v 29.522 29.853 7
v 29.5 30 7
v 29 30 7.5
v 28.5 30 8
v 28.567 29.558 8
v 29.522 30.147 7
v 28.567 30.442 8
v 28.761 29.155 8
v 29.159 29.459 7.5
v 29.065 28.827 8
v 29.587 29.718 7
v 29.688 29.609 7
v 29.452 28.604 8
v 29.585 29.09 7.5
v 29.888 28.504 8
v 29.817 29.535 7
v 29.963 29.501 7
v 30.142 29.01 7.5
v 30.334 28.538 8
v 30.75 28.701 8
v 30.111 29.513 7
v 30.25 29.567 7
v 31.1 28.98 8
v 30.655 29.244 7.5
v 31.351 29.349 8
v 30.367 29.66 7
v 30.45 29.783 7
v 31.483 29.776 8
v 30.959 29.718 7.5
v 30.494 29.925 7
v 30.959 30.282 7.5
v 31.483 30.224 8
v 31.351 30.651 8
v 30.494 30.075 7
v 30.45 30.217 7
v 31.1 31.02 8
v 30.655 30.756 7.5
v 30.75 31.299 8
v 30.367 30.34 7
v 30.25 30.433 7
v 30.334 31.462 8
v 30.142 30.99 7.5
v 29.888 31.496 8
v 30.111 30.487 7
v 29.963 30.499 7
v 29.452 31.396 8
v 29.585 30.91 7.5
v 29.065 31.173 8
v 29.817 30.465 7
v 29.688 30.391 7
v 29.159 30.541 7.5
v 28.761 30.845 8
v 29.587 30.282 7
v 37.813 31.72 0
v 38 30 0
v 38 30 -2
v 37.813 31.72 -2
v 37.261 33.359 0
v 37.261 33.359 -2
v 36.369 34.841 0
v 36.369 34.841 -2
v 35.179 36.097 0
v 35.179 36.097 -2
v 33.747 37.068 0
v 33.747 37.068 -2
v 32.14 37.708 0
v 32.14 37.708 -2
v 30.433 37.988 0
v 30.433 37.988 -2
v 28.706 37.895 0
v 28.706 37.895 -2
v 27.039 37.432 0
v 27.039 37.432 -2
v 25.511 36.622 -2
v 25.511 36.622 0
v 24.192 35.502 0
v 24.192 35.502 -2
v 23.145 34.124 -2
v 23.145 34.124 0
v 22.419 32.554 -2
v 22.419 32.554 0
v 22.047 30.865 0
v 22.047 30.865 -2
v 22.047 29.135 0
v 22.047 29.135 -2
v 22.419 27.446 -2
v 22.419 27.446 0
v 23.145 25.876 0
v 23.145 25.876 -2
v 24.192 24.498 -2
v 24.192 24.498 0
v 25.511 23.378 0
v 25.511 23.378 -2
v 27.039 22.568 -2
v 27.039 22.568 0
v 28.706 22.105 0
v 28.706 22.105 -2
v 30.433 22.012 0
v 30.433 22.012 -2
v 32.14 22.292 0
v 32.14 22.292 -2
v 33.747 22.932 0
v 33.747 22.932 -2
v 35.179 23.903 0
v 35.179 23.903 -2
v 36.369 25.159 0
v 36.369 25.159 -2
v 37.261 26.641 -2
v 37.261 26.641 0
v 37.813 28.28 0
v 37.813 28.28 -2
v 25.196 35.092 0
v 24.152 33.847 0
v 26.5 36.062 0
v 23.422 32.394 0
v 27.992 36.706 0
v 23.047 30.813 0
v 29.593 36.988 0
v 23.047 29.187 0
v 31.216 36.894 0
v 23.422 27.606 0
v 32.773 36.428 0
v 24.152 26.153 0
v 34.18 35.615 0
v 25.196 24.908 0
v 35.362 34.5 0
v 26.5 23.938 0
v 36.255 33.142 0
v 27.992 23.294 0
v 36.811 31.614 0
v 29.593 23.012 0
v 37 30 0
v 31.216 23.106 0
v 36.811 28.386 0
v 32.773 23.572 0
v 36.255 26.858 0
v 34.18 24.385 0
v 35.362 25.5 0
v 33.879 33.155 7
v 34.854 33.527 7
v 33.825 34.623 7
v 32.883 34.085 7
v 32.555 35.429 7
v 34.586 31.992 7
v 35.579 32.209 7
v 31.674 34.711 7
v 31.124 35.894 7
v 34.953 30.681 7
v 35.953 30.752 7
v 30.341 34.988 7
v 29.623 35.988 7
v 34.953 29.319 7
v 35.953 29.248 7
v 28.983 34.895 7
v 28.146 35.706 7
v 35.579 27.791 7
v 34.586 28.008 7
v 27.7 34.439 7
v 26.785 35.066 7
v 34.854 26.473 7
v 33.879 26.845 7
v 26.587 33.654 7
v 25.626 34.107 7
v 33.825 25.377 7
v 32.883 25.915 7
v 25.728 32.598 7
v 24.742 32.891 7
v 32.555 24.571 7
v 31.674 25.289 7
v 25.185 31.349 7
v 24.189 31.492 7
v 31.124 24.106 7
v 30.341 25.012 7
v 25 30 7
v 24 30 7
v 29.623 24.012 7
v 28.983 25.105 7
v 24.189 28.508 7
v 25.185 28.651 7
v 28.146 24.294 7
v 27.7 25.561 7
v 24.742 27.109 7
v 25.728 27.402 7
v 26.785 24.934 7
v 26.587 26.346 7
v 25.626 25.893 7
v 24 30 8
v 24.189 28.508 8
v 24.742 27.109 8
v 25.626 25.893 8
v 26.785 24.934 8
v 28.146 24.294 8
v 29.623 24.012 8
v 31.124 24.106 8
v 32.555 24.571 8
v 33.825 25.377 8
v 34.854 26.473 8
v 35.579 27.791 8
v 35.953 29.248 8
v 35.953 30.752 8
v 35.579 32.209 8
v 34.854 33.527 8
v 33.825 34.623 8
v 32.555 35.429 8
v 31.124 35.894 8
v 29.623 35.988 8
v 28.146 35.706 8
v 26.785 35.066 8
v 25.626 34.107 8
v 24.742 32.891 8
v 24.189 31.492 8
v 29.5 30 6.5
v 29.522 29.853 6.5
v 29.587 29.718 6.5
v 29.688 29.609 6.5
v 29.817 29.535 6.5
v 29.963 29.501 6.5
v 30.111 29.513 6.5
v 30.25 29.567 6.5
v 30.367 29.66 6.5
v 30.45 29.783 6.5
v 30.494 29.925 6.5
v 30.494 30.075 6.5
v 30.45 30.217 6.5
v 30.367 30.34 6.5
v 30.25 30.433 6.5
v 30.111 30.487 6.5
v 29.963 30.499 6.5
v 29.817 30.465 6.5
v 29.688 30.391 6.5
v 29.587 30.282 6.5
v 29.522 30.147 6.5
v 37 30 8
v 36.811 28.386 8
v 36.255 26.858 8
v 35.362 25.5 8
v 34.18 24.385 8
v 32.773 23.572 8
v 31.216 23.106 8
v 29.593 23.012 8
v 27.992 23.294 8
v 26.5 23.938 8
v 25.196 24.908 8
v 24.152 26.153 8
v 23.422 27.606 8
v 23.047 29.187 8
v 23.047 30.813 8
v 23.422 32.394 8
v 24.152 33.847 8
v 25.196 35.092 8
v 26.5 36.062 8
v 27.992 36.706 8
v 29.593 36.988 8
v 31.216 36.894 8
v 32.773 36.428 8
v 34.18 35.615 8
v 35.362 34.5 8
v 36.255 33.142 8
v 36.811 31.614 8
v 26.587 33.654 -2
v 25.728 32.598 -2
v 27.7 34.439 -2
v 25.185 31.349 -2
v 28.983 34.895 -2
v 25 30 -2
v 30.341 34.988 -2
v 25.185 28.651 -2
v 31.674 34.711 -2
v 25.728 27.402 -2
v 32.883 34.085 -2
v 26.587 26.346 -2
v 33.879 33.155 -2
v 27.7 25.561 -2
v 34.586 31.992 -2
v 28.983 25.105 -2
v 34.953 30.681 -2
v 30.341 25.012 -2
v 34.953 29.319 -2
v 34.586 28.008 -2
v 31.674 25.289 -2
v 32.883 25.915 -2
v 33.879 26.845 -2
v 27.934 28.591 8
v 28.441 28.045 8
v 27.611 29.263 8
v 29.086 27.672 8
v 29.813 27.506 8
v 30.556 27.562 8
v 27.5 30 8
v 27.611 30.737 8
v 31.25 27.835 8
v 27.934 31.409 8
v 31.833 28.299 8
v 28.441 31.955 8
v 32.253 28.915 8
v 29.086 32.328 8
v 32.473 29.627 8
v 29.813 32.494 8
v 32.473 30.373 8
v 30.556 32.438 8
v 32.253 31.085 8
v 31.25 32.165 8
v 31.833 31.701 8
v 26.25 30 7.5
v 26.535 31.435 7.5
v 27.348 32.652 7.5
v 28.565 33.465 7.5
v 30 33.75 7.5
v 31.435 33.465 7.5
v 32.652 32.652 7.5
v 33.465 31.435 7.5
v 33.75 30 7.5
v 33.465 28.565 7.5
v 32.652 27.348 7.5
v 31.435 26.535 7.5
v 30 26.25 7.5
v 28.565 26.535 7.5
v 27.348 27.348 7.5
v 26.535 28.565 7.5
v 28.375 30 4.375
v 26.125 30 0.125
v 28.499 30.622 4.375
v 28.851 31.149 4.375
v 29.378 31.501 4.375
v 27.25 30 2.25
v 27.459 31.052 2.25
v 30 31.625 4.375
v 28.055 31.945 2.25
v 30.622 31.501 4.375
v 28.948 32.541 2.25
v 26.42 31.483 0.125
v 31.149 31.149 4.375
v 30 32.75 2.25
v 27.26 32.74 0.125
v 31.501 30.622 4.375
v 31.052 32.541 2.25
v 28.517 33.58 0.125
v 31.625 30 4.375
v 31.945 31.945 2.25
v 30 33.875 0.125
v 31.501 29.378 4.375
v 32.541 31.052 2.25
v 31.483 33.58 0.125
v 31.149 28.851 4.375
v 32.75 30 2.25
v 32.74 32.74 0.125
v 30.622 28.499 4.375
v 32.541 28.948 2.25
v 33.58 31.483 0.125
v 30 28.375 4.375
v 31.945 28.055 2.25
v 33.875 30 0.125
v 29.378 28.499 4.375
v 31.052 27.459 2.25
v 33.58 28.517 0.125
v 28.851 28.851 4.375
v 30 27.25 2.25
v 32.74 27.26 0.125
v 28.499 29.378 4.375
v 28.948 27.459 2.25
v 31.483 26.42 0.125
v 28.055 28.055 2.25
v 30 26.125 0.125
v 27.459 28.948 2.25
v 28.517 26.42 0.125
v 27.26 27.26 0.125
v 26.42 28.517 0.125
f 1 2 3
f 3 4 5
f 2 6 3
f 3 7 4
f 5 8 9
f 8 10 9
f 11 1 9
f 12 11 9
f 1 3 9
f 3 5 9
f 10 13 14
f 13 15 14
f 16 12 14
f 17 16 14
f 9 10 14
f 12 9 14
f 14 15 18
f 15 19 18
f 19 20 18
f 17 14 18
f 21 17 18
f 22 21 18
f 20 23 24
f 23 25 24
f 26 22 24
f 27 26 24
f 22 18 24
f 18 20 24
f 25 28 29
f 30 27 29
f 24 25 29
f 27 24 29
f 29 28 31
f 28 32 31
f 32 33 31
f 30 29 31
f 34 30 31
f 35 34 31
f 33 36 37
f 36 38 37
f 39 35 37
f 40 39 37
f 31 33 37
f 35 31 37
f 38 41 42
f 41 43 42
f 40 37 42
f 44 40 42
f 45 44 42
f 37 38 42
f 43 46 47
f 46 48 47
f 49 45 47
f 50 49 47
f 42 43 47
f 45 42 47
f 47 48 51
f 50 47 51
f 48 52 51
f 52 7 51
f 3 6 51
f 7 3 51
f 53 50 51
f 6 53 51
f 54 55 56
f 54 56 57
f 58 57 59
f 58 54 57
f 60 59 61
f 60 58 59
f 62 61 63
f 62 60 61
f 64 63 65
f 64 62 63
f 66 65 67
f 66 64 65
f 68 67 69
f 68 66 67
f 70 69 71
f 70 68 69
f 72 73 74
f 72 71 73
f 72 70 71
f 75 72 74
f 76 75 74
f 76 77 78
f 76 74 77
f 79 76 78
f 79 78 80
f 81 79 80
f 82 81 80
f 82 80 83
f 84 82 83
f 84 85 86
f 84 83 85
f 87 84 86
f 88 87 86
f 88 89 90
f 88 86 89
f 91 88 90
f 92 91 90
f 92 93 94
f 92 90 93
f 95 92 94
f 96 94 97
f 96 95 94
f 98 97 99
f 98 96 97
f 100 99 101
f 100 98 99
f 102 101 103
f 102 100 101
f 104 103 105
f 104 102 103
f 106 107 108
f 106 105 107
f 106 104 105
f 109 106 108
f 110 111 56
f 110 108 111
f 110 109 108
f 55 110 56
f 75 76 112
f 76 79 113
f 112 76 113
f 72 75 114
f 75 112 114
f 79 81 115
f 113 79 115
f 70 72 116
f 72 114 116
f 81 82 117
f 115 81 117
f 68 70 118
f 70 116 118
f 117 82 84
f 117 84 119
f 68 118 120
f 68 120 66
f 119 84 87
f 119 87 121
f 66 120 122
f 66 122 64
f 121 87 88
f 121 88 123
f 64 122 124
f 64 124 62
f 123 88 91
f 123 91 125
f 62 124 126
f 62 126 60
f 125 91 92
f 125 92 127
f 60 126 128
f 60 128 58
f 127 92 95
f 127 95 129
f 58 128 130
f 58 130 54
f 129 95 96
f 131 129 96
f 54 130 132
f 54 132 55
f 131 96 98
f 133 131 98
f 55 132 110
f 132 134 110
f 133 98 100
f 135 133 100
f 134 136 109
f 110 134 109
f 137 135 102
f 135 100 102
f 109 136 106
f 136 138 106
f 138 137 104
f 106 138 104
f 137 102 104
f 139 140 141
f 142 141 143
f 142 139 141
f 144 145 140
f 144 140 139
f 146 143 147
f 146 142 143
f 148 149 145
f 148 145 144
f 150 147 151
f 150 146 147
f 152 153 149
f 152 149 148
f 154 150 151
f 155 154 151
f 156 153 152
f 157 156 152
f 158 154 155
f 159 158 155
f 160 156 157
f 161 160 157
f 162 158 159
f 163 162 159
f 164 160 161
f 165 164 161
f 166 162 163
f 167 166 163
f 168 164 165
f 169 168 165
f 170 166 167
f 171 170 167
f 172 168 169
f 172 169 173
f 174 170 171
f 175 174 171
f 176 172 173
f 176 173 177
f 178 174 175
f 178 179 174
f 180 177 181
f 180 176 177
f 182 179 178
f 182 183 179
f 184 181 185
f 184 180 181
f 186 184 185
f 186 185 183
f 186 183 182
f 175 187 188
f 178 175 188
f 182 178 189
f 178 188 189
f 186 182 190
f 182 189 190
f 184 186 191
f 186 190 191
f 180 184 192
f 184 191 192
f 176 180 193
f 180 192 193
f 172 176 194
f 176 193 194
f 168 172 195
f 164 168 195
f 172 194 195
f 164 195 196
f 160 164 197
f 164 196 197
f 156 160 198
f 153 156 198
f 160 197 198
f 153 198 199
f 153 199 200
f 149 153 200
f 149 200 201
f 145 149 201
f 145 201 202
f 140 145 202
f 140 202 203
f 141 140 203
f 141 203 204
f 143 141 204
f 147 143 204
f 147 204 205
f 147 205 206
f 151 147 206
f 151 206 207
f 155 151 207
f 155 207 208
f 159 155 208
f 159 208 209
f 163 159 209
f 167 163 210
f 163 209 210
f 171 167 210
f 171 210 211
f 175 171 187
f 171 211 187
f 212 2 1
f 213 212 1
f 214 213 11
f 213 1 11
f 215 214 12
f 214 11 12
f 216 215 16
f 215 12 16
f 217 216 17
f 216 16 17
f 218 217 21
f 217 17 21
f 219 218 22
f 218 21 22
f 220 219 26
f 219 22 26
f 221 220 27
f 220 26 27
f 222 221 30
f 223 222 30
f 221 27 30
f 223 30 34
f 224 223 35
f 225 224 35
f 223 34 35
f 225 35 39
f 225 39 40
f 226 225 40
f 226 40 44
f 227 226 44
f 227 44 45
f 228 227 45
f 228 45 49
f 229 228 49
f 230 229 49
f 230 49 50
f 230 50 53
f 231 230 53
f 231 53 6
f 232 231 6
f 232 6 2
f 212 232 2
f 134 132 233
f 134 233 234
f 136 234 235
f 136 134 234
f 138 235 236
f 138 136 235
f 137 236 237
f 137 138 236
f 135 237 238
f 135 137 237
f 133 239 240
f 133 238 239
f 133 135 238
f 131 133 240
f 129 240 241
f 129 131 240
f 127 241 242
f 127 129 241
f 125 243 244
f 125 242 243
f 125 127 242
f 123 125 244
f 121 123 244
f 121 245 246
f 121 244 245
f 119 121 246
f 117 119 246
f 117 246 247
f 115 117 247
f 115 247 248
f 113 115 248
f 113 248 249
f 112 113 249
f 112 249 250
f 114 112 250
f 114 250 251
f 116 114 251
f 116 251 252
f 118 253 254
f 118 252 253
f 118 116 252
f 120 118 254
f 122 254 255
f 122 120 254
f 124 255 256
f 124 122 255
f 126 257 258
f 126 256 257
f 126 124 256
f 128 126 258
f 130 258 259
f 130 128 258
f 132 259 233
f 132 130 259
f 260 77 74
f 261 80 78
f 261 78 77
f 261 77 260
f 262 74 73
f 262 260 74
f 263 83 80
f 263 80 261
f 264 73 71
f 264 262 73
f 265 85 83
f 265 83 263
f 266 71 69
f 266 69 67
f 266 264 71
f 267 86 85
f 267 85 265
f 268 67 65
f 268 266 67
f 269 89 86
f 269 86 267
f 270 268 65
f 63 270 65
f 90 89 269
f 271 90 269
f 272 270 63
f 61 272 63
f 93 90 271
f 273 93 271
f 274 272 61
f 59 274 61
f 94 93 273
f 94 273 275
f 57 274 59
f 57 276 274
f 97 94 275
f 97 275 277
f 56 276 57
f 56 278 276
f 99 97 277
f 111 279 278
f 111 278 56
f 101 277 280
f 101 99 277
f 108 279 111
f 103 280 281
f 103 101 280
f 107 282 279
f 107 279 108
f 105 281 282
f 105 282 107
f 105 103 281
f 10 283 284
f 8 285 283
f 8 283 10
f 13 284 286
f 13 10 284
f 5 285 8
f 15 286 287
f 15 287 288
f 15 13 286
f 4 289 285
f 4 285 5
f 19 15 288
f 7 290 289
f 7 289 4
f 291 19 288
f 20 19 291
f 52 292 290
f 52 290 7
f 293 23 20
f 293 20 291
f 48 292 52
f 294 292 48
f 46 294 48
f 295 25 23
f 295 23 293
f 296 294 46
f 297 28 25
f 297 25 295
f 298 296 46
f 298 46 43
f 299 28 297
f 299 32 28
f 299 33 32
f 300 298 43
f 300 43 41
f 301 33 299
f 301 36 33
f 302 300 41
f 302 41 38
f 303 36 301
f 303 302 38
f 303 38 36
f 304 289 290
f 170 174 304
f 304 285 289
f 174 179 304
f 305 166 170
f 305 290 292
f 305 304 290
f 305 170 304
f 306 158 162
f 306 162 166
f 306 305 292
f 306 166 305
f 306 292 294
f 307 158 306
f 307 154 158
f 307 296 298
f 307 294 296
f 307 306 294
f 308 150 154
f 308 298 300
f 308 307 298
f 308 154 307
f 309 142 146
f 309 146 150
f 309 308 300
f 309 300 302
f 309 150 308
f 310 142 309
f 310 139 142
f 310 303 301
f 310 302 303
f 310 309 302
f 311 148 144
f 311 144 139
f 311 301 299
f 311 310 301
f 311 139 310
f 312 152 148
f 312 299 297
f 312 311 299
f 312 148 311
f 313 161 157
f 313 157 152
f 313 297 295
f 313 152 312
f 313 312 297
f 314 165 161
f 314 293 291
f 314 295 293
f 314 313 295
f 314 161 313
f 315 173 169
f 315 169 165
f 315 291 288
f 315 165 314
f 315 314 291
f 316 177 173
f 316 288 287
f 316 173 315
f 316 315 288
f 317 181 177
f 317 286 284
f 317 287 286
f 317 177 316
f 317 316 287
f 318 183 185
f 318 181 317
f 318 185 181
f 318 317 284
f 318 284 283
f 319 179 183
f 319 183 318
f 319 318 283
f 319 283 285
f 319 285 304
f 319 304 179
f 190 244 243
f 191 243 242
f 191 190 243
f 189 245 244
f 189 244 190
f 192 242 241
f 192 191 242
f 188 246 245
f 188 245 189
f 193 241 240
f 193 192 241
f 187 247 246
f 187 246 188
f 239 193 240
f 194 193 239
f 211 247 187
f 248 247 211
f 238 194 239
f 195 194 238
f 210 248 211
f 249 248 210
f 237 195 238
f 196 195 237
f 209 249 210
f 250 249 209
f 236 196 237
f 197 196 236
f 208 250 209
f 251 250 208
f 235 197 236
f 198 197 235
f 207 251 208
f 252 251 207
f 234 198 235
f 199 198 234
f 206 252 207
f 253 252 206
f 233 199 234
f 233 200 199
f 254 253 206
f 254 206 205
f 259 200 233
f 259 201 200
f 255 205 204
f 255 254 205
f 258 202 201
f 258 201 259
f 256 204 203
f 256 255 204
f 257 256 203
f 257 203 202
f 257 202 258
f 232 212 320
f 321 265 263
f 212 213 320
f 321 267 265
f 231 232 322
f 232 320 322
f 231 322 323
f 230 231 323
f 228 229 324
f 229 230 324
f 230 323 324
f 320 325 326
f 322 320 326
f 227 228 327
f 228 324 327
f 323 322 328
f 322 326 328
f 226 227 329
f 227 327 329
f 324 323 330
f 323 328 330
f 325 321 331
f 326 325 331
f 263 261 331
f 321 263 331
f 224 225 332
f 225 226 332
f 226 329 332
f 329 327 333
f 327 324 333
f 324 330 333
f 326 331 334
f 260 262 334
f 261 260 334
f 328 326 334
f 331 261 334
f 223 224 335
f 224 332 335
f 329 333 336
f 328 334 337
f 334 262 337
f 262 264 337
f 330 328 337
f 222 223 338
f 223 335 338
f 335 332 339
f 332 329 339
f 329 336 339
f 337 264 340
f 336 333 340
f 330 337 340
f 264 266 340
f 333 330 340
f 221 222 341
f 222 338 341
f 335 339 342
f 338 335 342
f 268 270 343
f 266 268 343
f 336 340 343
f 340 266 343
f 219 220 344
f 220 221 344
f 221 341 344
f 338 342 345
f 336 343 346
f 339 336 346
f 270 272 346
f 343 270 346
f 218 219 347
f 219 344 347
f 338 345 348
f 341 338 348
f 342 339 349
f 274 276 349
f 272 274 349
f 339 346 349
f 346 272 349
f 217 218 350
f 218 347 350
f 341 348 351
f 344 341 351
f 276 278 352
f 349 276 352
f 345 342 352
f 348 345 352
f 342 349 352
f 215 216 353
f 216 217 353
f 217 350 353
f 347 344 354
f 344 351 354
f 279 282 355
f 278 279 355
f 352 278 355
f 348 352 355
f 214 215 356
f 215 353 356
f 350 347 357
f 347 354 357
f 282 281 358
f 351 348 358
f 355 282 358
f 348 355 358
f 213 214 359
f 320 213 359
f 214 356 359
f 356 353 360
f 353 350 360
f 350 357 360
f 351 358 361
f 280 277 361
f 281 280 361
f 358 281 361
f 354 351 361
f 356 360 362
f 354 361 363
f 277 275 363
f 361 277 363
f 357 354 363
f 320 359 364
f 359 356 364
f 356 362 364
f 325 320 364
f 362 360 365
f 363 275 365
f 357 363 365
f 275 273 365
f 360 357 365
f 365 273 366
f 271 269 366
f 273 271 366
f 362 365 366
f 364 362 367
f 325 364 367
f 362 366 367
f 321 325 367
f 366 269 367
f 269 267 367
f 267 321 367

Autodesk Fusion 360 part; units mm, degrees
sketch "Sketch1" plane through (0, 0, 0) normal (0, 0, 1) x (1, 0, 0)
  circle A0 centre (30, 30) radius 7
  dimension "d1" = 14
extrude "Extrude1" add sketch "Sketch1" along normal blind 8
sketch "Sketch2" plane through (0, 0, 0) normal (0, 0, -1) x (1, 0, 0)
  circle A0 centre (30, -30) radius 7
  circle A1 centre (30, -30) radius 8
  dimension "d4" = 16
extrude "Extrude2" add sketch "Sketch2" along normal blind 2 contours A0 | A1
sketch "Sketch3" plane through (0, 0, 8) normal (0, 0, 1) x (-1, 0, 0)
  circle A0 centre (-30, -30) radius 7
  circle A1 centre (-30, -30) radius 2.5
  circle A2 centre (-30, -30) radius 1.5
  circle A3 centre (-30, -30) radius 6
  circle A4 centre (-30, -30) radius 0.5
  circle A5 centre (-30, -30) radius 5
  dimension "d7" = 5
  dimension "d8" = 3
  dimension "d9" = 12
  dimension "d10" = 1
  dimension "d13" = 10
extrude "Extrude3" cut sketch "Sketch3" against normal blind 16 contours A4
extrude "Extrude4" cut sketch "Sketch3" against normal blind 1 contours A3
chamfer "Chamfer1" distance 2.5 distance2 1 1 edges at (34.6616, 31.8081, 8) measured on face at (26.5186, 30.2484, 8)
chamfer "Chamfer2" distance 1 distance2 1 1 edges at (30.4662, 29.8192, 8) measured on face at (28.1756, 30.1242, 8)
sketch "Sketch4" plane through (0, 0, -2) normal (0, 0, -1) x (1, 0, 0)
  circle A0 centre (30, -30) radius 0.5
  circle A1 centre (30, -30) radius 8
  circle A2 centre (30, -30) radius 5
  dimension "d20" = 10
chamfer "Chamfer3" distance 4.5 distance2 8.5 1 edges at (30.4662, 30.1808, -2) measured on face at (35.4684, 30.4223, -2)
